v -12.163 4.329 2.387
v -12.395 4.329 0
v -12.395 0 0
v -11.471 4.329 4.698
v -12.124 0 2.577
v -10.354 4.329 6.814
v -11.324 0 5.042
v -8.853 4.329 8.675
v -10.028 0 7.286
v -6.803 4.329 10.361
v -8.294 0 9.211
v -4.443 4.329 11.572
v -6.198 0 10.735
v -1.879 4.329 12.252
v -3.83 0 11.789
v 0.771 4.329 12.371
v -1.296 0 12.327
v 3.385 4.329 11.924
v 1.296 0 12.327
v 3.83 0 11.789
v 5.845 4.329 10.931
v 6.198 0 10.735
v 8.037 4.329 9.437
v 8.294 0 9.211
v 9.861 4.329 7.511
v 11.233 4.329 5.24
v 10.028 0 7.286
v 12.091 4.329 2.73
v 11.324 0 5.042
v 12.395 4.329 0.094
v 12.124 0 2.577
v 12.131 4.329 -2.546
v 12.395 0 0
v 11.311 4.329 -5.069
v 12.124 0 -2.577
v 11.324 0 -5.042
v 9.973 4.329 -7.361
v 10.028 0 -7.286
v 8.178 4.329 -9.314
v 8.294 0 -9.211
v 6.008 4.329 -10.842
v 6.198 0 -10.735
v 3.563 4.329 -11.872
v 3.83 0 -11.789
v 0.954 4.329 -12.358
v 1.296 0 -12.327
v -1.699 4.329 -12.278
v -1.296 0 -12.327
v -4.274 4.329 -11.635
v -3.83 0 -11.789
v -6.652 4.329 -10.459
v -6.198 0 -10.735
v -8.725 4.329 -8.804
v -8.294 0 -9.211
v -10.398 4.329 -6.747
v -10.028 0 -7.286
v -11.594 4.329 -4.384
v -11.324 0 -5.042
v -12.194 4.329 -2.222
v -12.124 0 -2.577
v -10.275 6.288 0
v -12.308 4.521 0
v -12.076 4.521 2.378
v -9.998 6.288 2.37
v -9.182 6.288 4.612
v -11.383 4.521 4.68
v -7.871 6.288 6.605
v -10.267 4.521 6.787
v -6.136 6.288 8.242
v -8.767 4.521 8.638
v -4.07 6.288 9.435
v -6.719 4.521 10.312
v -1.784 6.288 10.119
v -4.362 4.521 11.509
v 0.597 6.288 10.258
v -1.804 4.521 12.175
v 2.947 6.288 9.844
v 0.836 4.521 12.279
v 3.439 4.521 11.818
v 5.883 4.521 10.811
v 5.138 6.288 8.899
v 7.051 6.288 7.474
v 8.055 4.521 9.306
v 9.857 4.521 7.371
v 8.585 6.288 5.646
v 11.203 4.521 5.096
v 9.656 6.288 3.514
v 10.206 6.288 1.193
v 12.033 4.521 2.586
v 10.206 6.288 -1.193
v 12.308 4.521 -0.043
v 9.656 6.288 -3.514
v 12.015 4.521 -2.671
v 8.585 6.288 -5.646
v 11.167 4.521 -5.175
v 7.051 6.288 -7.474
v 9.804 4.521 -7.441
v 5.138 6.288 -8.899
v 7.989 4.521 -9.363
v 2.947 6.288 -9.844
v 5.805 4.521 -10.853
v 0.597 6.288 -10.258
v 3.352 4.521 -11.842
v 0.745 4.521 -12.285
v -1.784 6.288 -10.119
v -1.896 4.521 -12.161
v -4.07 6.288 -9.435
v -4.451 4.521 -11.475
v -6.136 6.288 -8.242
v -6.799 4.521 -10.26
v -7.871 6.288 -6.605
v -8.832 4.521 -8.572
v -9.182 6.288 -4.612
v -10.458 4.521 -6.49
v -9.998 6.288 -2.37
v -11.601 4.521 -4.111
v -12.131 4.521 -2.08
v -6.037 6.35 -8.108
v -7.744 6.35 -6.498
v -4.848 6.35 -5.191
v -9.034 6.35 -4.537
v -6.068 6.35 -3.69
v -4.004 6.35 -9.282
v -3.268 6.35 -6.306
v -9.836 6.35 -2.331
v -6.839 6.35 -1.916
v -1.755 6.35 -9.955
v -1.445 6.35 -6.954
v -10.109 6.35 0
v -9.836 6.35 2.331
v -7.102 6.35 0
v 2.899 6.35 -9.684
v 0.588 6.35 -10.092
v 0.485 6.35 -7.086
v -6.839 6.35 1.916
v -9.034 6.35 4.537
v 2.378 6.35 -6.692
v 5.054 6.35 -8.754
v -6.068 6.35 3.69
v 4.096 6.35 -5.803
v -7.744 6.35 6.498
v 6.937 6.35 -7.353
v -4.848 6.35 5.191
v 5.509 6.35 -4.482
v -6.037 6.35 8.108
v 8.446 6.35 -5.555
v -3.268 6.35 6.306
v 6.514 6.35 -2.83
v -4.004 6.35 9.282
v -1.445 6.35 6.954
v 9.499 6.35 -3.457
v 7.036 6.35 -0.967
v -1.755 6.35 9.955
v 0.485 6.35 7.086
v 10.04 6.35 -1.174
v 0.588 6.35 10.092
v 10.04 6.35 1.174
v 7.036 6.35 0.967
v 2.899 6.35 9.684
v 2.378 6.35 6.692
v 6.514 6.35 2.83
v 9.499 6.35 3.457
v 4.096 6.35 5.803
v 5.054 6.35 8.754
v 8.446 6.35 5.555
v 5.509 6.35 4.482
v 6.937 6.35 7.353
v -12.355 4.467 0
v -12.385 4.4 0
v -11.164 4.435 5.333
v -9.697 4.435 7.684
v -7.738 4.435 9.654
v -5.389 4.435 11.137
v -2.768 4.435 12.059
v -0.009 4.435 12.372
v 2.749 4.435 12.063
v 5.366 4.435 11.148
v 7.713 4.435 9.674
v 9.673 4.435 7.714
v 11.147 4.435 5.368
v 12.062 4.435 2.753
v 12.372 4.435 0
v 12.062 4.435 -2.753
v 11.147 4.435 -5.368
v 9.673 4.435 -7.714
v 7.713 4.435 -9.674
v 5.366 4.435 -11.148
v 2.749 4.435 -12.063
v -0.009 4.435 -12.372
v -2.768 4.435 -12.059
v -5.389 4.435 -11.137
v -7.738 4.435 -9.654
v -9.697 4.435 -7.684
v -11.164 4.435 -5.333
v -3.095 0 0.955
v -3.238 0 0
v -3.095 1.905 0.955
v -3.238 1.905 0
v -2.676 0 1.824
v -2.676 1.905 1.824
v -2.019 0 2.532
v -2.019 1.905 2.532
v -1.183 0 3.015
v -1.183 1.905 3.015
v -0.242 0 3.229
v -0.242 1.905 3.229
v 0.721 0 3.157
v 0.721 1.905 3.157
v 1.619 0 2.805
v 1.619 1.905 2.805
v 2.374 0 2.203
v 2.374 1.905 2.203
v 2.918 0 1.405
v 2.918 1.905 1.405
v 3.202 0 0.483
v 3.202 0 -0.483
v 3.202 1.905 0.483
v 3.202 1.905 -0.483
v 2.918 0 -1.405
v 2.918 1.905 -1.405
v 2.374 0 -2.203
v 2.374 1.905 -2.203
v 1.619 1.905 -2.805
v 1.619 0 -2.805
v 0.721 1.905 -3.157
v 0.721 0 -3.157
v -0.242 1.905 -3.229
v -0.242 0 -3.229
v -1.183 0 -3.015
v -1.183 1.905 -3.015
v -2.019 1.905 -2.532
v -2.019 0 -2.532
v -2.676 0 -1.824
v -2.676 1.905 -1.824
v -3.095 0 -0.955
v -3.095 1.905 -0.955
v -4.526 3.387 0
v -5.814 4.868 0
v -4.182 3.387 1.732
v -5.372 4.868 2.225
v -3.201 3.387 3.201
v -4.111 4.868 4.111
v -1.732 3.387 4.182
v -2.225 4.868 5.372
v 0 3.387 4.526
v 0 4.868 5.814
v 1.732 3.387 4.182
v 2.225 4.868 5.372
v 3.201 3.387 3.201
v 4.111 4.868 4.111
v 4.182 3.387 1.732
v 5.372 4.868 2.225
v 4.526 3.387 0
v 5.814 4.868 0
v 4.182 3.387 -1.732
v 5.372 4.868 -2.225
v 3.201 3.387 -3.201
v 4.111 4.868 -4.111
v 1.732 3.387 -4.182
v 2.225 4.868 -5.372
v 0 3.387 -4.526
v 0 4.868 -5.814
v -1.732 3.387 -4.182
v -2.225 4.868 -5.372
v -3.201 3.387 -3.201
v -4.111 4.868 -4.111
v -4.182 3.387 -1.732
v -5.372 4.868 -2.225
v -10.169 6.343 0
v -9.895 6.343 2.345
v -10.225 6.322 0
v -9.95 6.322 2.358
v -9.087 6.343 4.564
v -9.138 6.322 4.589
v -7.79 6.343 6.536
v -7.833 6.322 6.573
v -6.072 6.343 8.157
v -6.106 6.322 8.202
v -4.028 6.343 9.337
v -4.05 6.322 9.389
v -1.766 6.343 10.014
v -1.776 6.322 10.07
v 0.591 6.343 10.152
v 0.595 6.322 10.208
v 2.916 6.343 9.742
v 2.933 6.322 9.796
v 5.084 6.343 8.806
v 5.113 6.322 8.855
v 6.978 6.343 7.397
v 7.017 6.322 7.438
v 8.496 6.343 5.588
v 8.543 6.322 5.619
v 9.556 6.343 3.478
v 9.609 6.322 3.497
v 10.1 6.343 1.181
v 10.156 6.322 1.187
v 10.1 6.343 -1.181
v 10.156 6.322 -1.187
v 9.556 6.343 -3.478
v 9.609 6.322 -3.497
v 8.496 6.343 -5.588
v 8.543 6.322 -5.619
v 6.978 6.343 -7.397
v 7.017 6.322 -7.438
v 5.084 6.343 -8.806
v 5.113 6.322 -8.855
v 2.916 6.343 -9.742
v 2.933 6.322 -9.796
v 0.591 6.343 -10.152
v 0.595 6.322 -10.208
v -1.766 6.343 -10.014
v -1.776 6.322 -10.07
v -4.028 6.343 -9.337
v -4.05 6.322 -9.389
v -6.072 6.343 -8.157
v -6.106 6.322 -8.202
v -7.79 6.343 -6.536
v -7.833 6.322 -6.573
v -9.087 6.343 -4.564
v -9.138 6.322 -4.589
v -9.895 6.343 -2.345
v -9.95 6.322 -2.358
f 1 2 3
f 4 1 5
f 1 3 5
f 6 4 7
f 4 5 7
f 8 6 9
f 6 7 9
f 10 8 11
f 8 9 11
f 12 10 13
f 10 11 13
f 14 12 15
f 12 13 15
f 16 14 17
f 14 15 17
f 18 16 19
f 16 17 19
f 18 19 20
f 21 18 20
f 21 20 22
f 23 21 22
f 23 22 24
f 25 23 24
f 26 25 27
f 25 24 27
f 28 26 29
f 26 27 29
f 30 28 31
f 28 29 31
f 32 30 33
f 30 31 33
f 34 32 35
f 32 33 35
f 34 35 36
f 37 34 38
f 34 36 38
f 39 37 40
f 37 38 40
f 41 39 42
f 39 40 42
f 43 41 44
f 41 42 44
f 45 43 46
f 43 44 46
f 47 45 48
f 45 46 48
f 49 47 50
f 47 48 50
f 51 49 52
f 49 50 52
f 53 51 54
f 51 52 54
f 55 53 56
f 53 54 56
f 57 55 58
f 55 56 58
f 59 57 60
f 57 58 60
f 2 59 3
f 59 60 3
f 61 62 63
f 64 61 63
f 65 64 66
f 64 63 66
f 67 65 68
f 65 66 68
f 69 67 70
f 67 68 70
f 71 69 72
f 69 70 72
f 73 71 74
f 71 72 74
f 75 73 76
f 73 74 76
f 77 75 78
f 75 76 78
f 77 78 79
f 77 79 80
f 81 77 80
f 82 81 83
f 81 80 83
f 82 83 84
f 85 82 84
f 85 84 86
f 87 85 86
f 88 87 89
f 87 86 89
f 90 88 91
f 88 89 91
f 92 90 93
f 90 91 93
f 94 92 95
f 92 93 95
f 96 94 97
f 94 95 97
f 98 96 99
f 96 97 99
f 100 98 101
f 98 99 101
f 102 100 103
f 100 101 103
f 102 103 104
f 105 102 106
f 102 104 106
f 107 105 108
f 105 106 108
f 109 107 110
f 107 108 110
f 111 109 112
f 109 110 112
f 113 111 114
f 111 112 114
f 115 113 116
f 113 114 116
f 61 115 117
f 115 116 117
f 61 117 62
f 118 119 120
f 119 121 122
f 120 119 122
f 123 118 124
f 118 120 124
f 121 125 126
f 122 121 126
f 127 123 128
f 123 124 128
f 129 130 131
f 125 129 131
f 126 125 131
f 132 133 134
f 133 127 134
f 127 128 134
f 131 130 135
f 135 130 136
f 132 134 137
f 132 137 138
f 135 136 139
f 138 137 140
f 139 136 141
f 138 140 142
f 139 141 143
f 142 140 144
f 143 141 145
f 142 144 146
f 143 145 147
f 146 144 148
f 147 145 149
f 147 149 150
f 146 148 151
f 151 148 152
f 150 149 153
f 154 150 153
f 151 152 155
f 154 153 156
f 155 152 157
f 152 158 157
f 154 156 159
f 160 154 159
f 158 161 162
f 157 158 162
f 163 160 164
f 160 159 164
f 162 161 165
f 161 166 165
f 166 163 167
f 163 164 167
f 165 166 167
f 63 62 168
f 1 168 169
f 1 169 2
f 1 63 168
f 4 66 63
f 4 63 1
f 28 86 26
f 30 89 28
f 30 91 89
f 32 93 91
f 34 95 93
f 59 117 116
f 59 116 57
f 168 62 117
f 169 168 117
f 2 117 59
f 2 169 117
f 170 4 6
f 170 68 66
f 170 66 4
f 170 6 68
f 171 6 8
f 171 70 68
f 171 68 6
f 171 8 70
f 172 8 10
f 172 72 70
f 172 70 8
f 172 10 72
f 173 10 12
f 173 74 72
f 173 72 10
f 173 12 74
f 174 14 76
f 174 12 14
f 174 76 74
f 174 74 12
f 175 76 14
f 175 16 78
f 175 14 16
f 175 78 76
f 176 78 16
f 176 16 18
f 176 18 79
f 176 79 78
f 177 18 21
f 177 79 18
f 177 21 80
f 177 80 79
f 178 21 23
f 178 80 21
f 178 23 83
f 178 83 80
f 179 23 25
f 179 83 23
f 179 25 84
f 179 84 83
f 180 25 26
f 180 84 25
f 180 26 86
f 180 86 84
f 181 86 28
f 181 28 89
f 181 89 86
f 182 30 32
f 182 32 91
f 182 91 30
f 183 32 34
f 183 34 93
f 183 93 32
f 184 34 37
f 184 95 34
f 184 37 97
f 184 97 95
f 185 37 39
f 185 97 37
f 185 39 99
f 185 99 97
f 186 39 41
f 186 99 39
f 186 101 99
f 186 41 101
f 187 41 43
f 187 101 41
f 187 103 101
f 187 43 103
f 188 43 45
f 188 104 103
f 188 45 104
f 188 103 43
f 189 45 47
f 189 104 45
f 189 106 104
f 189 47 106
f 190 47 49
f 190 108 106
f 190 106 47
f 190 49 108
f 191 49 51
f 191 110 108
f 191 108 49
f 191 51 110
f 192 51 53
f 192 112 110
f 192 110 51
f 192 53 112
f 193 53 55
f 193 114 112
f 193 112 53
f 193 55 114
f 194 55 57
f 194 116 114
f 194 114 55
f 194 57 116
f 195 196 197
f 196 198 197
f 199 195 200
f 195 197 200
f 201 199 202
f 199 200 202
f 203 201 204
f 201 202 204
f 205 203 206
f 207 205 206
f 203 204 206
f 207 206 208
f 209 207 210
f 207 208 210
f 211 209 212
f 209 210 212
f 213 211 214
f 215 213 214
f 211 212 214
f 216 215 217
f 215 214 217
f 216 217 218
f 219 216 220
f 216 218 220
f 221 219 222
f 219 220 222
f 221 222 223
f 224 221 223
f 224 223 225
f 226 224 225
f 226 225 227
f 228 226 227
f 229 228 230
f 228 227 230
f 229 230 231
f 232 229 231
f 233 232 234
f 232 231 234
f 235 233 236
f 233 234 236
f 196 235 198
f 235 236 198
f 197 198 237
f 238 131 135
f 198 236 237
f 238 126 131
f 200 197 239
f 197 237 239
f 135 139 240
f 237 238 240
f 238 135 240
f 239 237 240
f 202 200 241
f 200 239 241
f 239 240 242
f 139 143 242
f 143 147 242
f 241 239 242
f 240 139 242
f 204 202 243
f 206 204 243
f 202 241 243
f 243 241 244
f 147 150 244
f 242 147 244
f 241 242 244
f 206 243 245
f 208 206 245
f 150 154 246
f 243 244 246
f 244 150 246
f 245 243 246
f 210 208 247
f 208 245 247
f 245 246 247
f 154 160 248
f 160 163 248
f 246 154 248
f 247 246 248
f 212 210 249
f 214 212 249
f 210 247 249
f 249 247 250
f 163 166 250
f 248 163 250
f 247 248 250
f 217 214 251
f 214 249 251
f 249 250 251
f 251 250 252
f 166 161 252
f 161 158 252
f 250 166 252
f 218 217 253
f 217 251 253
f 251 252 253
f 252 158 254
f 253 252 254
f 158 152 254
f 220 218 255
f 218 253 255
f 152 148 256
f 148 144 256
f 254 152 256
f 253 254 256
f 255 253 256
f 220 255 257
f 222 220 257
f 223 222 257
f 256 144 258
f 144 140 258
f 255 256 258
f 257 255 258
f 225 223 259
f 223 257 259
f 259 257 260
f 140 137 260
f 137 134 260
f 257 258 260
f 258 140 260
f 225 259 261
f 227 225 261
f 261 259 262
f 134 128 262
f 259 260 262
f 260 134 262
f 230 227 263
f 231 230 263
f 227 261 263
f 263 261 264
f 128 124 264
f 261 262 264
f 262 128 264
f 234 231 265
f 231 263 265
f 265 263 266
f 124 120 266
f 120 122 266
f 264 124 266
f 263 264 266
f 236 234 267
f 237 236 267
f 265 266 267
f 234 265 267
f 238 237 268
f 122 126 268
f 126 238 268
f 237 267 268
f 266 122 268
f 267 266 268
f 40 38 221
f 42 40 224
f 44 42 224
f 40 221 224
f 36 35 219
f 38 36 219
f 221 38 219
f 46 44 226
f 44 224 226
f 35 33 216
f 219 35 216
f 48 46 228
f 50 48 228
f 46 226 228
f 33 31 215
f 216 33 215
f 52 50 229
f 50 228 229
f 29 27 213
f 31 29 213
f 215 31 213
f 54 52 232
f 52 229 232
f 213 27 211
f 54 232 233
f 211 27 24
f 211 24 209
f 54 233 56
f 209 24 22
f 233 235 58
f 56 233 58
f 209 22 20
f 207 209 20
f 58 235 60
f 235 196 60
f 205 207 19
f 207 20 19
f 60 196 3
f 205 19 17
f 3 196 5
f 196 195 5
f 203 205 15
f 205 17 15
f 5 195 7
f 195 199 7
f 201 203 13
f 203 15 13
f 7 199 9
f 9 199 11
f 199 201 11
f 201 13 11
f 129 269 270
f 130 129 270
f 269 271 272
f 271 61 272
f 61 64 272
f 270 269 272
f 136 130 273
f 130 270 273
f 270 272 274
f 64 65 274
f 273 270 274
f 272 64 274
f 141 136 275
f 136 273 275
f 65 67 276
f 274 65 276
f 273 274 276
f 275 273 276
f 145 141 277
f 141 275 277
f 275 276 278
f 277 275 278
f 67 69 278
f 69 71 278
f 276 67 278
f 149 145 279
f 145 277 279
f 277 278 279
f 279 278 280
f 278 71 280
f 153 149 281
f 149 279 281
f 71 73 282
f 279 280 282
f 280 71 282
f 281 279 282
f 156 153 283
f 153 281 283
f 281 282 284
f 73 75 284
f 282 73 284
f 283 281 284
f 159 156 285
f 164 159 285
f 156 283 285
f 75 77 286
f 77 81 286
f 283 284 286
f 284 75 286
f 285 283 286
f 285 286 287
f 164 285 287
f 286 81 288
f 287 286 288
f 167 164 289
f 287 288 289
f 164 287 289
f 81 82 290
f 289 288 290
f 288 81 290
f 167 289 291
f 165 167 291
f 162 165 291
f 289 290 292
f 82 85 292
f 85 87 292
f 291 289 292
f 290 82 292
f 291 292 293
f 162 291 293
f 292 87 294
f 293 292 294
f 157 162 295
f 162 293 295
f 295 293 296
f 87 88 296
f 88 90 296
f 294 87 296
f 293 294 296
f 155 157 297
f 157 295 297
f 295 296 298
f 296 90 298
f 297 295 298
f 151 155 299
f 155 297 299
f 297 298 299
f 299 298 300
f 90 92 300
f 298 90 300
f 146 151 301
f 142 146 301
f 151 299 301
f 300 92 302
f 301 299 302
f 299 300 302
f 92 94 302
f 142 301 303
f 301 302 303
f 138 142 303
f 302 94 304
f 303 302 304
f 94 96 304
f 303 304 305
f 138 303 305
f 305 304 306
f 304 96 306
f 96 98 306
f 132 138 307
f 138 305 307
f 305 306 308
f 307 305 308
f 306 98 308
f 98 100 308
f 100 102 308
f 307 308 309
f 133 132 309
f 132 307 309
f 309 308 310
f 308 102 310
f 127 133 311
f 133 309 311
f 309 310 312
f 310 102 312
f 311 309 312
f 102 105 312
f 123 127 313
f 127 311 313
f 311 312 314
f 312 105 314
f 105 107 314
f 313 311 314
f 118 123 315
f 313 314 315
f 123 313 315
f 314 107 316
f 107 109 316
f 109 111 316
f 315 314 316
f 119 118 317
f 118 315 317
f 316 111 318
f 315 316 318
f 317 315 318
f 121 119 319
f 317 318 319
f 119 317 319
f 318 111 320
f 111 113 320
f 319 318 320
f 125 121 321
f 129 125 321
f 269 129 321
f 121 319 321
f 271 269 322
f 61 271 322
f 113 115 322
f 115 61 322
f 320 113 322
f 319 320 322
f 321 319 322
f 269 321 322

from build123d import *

# Parameters (mm, degrees)
F2_R = 0.254


with BuildPart() as f1:
    # F0 (on Top) → F1 (revolve)
    with BuildSketch(Plane.XY):
        Polygon((-12.3952, 0), (-3.2385, 0), (-3.2385, 1.905), (-7.10248, 6.35), (-10.203748, 6.35), (-12.3952, 4.445), align=None)
    revolve(axis=Axis((0, 4.669294, 0), (0, 1, 0)))

    # F2
    f2_edges = [f1.edges().sort_by_distance(p)[0] for p in [
        (12.3952, 4.445, 0),
        (10.203748, 6.35, 0),
    ]]
    fillet(f2_edges, radius=F2_R)


solid = f1.part
